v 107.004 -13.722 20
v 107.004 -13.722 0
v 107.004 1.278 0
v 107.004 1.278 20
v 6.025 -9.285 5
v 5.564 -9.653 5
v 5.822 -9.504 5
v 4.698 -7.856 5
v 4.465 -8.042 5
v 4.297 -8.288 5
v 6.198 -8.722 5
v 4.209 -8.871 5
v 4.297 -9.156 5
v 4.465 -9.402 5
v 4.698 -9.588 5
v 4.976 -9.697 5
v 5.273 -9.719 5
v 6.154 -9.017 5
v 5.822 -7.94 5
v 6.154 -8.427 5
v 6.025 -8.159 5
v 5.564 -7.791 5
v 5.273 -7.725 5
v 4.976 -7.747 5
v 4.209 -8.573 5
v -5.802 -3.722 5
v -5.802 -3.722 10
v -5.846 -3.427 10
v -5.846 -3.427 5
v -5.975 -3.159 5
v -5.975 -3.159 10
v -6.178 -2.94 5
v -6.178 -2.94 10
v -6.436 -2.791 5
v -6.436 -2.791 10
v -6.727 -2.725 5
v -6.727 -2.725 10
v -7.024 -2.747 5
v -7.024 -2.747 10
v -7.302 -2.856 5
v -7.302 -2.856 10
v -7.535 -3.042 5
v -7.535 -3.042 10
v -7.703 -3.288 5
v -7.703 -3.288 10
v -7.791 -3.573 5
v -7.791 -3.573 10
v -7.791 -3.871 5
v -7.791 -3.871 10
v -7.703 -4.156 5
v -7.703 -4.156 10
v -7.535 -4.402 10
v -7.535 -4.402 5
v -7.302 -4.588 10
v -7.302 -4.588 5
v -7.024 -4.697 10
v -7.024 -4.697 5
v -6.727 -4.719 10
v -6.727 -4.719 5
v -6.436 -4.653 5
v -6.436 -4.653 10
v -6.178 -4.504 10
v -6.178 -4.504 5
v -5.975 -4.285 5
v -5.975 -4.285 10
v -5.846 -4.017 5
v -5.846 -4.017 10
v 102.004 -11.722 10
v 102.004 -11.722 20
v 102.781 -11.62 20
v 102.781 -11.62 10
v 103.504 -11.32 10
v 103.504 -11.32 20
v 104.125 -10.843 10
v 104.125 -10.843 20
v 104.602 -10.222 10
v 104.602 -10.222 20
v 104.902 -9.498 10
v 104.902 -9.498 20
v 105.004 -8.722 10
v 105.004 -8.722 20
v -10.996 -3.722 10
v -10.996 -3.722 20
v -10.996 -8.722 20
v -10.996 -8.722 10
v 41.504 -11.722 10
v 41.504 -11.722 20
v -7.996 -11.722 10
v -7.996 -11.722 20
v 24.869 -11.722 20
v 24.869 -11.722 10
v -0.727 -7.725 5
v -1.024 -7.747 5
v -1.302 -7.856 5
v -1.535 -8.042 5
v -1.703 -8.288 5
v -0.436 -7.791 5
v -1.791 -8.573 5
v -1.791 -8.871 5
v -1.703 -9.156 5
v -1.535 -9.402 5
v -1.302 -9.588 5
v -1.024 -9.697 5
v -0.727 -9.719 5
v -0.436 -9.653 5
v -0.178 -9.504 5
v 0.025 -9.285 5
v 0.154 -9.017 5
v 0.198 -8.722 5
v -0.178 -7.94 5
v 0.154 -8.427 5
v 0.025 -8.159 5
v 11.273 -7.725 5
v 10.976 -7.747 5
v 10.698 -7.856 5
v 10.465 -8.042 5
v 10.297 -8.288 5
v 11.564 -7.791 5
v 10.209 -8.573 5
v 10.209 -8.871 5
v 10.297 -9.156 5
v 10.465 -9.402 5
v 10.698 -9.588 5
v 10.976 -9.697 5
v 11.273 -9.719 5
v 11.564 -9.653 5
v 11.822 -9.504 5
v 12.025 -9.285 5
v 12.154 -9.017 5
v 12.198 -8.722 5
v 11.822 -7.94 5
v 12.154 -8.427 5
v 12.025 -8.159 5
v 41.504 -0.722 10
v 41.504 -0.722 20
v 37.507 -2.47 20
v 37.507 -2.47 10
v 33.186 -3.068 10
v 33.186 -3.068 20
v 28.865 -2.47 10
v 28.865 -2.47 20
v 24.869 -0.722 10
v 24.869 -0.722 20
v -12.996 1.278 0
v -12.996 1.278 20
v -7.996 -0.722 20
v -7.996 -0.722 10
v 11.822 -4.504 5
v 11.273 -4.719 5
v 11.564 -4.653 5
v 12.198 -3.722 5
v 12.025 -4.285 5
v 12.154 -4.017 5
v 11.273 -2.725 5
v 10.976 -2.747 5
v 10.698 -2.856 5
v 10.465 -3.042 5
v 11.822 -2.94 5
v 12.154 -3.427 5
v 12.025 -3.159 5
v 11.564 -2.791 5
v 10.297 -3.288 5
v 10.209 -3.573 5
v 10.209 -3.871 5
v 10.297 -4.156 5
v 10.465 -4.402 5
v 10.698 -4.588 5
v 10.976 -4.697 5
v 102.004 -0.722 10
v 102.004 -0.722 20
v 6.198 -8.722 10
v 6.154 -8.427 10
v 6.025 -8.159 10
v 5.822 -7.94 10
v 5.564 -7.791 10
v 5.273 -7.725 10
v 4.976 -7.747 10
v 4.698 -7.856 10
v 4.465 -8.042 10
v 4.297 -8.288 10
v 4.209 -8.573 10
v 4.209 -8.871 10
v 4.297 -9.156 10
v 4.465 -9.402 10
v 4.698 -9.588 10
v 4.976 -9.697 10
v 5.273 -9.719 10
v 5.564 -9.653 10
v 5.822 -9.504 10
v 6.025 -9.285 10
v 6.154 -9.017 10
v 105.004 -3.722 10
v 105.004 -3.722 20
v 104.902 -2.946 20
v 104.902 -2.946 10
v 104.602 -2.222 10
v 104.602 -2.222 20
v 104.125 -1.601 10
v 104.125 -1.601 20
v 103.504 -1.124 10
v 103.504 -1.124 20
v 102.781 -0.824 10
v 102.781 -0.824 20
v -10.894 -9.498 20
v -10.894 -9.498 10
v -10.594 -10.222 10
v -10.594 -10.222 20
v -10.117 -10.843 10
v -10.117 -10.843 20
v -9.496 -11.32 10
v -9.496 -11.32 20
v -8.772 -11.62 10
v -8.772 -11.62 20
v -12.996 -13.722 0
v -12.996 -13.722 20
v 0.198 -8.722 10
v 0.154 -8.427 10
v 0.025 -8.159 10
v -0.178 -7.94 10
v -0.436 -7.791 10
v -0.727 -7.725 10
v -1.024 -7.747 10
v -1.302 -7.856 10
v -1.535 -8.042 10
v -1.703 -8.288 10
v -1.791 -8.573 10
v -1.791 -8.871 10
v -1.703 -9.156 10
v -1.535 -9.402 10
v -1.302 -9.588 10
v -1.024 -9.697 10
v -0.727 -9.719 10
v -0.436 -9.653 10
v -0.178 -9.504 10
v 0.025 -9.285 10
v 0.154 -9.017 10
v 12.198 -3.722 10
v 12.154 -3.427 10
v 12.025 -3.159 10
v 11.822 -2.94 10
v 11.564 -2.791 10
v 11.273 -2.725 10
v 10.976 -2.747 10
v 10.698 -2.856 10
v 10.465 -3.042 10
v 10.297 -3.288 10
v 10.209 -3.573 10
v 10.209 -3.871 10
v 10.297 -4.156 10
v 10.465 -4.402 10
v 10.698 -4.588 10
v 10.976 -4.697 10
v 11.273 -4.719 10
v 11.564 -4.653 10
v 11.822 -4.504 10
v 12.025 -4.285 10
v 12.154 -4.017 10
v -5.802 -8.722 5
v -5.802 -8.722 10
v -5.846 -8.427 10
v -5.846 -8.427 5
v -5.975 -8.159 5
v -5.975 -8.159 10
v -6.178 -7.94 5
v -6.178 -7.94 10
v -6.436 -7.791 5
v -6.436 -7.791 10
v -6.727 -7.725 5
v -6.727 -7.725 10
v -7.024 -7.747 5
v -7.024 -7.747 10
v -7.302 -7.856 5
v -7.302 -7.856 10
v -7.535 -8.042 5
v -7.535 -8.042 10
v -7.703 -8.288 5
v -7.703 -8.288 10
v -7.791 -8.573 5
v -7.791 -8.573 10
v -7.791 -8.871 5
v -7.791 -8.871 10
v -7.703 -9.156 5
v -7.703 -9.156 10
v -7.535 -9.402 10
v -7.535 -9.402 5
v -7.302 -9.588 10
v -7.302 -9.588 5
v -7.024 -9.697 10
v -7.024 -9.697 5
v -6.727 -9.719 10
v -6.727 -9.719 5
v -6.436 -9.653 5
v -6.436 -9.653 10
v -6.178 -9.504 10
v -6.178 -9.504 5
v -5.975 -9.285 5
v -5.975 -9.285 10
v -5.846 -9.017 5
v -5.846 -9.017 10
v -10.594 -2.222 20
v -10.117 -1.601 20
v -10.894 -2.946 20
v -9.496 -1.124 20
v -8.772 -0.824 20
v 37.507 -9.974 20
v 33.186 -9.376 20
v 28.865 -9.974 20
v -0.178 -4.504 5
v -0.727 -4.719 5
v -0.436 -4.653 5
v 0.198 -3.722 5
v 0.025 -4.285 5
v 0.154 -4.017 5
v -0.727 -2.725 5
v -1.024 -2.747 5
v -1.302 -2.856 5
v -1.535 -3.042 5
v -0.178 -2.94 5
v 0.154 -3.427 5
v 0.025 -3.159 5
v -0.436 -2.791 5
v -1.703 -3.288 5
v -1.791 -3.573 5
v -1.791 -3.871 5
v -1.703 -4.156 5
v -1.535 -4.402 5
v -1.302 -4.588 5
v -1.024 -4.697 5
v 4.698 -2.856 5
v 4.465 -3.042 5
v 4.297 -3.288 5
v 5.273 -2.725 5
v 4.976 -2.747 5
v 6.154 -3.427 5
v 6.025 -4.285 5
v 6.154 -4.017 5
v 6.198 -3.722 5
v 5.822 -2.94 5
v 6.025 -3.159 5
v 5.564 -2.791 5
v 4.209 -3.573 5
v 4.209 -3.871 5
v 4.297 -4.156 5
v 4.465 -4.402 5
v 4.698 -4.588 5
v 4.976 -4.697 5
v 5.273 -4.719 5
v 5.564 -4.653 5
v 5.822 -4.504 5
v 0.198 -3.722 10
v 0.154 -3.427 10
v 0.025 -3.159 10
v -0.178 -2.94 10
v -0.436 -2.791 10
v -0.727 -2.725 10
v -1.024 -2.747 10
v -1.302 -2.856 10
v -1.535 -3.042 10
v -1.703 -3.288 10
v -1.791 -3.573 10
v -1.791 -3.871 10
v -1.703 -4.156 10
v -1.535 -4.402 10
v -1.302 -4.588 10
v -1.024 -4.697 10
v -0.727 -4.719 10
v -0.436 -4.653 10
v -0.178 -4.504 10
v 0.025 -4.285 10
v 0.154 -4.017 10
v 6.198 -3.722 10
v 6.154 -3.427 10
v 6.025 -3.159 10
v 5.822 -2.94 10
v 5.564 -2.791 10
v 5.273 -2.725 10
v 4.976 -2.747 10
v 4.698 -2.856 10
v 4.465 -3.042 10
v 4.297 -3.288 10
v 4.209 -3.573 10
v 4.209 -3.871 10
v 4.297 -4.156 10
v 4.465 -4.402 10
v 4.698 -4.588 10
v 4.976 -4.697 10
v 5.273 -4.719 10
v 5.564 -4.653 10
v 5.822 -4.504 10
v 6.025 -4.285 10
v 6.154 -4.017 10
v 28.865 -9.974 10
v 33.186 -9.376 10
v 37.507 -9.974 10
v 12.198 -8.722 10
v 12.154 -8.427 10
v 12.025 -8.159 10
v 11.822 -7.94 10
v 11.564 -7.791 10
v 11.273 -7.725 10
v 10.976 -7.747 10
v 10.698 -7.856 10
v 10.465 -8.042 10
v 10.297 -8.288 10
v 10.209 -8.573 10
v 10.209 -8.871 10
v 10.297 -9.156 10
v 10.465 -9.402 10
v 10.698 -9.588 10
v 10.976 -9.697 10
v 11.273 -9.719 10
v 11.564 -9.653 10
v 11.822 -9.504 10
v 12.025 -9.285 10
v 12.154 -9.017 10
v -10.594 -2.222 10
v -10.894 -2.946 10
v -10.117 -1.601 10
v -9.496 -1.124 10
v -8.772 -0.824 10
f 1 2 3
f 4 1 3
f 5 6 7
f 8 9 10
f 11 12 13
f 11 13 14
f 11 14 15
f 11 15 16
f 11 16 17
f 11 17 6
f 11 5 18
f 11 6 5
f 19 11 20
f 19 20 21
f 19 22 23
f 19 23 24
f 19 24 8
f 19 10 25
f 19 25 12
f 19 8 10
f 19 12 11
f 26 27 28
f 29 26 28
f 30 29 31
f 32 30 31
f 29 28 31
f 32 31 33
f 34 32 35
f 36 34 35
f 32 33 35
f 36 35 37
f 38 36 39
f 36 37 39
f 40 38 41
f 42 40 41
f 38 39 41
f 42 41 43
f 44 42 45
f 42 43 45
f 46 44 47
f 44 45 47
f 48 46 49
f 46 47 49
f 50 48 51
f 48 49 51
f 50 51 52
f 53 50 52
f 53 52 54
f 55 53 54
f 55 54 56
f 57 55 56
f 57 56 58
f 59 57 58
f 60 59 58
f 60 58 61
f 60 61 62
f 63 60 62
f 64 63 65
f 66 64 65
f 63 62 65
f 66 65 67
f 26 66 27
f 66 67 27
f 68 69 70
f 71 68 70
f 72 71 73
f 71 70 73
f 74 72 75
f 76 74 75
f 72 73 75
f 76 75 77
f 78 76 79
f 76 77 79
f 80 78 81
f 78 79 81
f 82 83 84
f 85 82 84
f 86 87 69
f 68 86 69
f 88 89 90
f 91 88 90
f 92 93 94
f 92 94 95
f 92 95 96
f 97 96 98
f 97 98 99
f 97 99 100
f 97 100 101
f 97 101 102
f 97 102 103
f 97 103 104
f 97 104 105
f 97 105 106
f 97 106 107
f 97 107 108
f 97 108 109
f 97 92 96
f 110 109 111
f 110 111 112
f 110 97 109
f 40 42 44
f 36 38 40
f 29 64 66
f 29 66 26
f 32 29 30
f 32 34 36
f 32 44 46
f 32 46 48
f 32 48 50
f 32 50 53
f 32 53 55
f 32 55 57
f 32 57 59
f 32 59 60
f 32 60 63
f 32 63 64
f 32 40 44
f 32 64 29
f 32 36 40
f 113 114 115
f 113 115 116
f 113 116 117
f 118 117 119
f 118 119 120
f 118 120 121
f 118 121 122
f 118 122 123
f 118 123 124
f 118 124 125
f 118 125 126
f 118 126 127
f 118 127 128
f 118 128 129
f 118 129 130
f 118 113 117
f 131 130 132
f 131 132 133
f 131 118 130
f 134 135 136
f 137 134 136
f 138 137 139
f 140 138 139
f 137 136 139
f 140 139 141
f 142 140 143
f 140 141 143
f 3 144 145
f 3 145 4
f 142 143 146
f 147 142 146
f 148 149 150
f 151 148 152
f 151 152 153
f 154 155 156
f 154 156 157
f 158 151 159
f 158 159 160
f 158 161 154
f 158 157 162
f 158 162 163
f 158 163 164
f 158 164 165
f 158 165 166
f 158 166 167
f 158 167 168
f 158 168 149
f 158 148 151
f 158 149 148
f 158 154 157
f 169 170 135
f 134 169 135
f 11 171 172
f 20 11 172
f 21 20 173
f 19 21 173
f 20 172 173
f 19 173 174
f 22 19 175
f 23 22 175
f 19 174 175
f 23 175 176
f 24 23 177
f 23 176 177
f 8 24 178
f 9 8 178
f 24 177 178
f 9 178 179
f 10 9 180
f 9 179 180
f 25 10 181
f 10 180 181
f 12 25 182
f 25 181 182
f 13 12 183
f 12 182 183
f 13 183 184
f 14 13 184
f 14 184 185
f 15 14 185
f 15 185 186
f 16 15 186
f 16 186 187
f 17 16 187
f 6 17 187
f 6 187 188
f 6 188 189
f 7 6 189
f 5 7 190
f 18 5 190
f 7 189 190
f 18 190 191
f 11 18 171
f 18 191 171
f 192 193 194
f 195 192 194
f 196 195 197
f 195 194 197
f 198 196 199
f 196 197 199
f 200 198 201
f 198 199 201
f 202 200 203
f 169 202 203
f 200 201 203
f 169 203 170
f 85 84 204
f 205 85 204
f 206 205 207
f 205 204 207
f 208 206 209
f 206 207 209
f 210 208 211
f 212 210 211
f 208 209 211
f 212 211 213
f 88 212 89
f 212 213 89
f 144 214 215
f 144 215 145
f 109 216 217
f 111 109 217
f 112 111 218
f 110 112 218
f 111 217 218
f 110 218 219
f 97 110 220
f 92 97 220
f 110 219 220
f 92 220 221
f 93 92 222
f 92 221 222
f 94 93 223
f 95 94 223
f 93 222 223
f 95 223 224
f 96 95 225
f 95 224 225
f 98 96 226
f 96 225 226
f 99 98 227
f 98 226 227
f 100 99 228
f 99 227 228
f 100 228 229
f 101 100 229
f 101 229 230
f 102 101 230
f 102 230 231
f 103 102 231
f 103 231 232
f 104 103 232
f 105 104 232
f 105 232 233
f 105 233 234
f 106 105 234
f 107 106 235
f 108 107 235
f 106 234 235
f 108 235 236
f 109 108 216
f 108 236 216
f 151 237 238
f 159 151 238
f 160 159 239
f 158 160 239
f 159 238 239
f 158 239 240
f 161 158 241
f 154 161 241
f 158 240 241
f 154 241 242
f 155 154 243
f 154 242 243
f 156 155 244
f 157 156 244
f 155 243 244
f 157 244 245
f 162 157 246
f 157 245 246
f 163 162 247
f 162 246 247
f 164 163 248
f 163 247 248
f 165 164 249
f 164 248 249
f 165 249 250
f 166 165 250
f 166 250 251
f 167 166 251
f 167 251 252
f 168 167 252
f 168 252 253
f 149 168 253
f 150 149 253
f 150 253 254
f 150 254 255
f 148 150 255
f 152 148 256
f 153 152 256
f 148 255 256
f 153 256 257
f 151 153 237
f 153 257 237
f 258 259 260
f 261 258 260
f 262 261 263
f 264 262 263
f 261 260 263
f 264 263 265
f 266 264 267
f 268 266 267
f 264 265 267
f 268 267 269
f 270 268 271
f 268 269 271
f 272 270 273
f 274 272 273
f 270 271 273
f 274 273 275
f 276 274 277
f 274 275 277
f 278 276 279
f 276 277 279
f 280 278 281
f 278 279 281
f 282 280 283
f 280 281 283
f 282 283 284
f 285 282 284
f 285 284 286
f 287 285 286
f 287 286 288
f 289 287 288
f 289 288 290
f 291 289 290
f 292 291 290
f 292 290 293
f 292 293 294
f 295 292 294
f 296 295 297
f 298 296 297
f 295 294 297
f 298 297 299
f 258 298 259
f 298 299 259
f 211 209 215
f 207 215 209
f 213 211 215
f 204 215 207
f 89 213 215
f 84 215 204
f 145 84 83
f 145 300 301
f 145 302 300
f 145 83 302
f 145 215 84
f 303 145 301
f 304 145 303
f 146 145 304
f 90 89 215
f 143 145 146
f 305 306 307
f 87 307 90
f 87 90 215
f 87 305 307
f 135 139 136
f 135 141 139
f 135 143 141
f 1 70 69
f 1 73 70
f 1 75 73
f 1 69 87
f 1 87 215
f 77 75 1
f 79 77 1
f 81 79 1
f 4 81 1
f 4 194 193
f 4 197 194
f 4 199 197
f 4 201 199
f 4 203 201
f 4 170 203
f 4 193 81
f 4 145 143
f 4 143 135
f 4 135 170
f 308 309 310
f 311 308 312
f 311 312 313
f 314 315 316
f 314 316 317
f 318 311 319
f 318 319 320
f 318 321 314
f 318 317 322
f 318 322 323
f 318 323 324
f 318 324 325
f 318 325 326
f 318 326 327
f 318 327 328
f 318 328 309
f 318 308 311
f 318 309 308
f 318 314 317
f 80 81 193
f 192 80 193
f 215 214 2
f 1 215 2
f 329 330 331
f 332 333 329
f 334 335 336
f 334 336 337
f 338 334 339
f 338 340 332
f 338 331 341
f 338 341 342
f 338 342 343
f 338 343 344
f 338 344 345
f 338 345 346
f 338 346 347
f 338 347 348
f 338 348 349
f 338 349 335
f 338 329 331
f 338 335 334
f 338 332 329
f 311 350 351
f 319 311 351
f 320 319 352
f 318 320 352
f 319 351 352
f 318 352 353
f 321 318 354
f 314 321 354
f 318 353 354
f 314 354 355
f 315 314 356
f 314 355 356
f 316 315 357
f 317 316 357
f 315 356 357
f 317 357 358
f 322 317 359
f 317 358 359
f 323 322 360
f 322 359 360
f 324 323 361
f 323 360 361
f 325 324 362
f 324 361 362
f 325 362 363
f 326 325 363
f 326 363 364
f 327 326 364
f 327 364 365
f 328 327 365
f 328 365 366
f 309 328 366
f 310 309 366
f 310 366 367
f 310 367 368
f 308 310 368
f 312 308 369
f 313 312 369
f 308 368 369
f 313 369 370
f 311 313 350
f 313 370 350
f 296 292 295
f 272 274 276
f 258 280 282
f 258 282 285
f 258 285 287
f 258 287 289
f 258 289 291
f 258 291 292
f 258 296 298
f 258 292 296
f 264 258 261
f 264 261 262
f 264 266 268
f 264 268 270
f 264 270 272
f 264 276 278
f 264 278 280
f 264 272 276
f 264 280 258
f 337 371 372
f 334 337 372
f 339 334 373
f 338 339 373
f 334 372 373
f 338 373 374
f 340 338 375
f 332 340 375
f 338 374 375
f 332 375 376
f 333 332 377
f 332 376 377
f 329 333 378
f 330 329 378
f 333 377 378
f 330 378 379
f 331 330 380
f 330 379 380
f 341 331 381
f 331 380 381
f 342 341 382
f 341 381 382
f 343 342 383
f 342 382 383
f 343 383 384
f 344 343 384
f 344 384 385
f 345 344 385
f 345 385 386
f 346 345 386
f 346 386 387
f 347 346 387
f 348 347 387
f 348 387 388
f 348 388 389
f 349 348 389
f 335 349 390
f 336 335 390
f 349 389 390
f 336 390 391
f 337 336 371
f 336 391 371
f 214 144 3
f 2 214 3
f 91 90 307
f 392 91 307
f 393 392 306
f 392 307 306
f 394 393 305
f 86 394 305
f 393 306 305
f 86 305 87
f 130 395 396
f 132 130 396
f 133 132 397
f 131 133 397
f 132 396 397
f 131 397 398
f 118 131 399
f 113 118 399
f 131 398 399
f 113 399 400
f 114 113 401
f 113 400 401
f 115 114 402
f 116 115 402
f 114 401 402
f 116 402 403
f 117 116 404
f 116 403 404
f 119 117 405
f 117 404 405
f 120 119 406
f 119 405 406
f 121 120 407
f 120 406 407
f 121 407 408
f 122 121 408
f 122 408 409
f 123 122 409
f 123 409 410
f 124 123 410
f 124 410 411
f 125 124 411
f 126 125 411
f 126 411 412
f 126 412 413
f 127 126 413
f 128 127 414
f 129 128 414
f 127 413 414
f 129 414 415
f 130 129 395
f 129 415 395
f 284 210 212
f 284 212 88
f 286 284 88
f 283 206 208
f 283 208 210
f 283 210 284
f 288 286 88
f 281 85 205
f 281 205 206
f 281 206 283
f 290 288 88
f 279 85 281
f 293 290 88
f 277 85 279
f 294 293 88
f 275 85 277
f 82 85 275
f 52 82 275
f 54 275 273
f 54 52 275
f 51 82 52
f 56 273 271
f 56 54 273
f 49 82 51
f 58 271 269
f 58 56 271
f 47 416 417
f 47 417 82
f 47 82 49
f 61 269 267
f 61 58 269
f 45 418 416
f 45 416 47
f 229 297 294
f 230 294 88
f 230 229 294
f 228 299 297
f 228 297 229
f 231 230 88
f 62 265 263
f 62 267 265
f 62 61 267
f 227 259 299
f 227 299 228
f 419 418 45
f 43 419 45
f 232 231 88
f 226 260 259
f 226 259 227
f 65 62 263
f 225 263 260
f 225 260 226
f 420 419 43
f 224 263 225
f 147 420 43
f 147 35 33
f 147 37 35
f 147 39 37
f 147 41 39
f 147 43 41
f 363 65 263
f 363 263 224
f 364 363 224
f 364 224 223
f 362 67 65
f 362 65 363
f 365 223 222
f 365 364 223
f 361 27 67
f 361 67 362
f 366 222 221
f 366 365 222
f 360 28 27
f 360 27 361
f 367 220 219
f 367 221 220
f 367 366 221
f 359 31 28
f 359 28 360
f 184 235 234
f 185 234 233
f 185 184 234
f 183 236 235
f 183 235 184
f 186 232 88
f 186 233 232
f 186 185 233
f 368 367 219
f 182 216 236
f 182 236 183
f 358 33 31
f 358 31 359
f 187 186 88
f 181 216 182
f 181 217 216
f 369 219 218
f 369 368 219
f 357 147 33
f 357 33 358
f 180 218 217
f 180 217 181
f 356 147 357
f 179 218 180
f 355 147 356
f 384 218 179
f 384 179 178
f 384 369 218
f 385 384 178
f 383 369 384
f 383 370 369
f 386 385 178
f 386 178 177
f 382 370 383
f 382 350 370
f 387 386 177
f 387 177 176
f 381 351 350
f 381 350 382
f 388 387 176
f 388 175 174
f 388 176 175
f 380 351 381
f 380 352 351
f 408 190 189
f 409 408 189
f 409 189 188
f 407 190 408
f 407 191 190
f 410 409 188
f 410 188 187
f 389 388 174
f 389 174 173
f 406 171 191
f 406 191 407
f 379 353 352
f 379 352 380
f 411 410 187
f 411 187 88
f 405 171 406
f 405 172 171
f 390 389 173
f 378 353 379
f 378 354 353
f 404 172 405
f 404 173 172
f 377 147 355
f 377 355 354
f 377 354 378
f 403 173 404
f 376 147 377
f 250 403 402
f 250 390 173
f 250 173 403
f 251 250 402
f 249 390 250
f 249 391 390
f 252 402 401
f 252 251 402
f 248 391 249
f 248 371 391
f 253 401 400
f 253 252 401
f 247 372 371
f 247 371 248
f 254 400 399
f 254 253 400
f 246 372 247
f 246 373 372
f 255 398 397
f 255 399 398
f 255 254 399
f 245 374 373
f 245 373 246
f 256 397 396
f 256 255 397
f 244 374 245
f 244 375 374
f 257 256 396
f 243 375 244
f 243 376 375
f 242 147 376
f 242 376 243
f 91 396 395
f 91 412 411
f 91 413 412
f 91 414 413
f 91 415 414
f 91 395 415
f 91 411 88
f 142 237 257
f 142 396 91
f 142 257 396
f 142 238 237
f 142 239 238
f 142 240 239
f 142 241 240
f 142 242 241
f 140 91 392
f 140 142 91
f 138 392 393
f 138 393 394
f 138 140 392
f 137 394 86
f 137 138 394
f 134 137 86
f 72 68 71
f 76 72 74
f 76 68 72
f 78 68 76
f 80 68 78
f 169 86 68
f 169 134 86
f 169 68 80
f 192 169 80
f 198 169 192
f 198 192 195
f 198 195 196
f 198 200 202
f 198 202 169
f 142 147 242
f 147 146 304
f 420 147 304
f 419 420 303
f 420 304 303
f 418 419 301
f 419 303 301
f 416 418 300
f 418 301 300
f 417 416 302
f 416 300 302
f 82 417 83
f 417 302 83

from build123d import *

# Parameters (mm, degrees)
F0_W     = 120
F0_H     = 15
F1_DEPTH = 20
F3_DEPTH = 10
F4_R     = 1
F5_DEPTH = 5


with BuildPart() as f1:
    # F0 (on Top) → F1 (new body)
    with BuildSketch(Plane.XY):
        with Locations((47.004177, -6.222026)):
            Rectangle(F0_W, F0_H)
    extrude(amount=F1_DEPTH)

    # F2 (on face) → F3 (cut)
    with BuildSketch(Plane.XY.offset(20)):
        with BuildLine():
            Line((24.868954, -0.722026), (-7.995823, -0.722026))
            ThreePointArc((-7.995823, -0.722026), (-10.117143, -1.600706), (-10.995823, -3.722026))
            Line((-10.995823, -3.722026), (-10.995823, -6.222026))
            Line((-10.995823, -6.222026), (105.004177, -6.222026))
            Line((105.004177, -6.222026), (105.004177, -3.722026))
            ThreePointArc((105.004177, -3.722026), (104.125498, -1.600706), (102.004177, -0.722026))
            Line((102.004177, -0.722026), (41.503951, -0.722026))
            ThreePointArc((41.503951, -0.722026), (33.186452, -3.06816), (24.868954, -0.722026))
        make_face()
        with BuildLine():
            Line((105.004177, -6.222026), (-10.995823, -6.222026))
            Line((-10.995823, -6.222026), (-10.995823, -8.722026))
            ThreePointArc((-10.995823, -8.722026), (-10.117143, -10.843347), (-7.995823, -11.722026))
            Line((-7.995823, -11.722026), (24.868954, -11.722026))
            ThreePointArc((24.868954, -11.722026), (33.186452, -9.375893), (41.503951, -11.722026))
            Line((41.503951, -11.722026), (102.004177, -11.722026))
            ThreePointArc((102.004177, -11.722026), (104.125498, -10.843347), (105.004177, -8.722026))
            Line((105.004177, -8.722026), (105.004177, -6.222026))
        make_face()
    extrude(amount=-F3_DEPTH, mode=Mode.SUBTRACT)

    # F4 (on face) → F5 (cut)
    with BuildSketch(Plane.XY.offset(10)):
        with Locations((-6.801731, -3.722026)):
            Circle(F4_R)
        with Locations((-0.801731, -3.722026)):
            Circle(F4_R)
        with Locations((5.198269, -3.722026)):
            Circle(F4_R)
        with Locations((11.198269, -3.722026)):
            Circle(F4_R)
        with Locations((11.198269, -8.722026)):
            Circle(F4_R)
        with Locations((5.198269, -8.722026)):
            Circle(F4_R)
        with Locations((-0.801731, -8.722026)):
            Circle(F4_R)
        with Locations((-6.801731, -8.722026)):
            Circle(F4_R)
    extrude(amount=-F5_DEPTH, mode=Mode.SUBTRACT)


solid = f1.part
